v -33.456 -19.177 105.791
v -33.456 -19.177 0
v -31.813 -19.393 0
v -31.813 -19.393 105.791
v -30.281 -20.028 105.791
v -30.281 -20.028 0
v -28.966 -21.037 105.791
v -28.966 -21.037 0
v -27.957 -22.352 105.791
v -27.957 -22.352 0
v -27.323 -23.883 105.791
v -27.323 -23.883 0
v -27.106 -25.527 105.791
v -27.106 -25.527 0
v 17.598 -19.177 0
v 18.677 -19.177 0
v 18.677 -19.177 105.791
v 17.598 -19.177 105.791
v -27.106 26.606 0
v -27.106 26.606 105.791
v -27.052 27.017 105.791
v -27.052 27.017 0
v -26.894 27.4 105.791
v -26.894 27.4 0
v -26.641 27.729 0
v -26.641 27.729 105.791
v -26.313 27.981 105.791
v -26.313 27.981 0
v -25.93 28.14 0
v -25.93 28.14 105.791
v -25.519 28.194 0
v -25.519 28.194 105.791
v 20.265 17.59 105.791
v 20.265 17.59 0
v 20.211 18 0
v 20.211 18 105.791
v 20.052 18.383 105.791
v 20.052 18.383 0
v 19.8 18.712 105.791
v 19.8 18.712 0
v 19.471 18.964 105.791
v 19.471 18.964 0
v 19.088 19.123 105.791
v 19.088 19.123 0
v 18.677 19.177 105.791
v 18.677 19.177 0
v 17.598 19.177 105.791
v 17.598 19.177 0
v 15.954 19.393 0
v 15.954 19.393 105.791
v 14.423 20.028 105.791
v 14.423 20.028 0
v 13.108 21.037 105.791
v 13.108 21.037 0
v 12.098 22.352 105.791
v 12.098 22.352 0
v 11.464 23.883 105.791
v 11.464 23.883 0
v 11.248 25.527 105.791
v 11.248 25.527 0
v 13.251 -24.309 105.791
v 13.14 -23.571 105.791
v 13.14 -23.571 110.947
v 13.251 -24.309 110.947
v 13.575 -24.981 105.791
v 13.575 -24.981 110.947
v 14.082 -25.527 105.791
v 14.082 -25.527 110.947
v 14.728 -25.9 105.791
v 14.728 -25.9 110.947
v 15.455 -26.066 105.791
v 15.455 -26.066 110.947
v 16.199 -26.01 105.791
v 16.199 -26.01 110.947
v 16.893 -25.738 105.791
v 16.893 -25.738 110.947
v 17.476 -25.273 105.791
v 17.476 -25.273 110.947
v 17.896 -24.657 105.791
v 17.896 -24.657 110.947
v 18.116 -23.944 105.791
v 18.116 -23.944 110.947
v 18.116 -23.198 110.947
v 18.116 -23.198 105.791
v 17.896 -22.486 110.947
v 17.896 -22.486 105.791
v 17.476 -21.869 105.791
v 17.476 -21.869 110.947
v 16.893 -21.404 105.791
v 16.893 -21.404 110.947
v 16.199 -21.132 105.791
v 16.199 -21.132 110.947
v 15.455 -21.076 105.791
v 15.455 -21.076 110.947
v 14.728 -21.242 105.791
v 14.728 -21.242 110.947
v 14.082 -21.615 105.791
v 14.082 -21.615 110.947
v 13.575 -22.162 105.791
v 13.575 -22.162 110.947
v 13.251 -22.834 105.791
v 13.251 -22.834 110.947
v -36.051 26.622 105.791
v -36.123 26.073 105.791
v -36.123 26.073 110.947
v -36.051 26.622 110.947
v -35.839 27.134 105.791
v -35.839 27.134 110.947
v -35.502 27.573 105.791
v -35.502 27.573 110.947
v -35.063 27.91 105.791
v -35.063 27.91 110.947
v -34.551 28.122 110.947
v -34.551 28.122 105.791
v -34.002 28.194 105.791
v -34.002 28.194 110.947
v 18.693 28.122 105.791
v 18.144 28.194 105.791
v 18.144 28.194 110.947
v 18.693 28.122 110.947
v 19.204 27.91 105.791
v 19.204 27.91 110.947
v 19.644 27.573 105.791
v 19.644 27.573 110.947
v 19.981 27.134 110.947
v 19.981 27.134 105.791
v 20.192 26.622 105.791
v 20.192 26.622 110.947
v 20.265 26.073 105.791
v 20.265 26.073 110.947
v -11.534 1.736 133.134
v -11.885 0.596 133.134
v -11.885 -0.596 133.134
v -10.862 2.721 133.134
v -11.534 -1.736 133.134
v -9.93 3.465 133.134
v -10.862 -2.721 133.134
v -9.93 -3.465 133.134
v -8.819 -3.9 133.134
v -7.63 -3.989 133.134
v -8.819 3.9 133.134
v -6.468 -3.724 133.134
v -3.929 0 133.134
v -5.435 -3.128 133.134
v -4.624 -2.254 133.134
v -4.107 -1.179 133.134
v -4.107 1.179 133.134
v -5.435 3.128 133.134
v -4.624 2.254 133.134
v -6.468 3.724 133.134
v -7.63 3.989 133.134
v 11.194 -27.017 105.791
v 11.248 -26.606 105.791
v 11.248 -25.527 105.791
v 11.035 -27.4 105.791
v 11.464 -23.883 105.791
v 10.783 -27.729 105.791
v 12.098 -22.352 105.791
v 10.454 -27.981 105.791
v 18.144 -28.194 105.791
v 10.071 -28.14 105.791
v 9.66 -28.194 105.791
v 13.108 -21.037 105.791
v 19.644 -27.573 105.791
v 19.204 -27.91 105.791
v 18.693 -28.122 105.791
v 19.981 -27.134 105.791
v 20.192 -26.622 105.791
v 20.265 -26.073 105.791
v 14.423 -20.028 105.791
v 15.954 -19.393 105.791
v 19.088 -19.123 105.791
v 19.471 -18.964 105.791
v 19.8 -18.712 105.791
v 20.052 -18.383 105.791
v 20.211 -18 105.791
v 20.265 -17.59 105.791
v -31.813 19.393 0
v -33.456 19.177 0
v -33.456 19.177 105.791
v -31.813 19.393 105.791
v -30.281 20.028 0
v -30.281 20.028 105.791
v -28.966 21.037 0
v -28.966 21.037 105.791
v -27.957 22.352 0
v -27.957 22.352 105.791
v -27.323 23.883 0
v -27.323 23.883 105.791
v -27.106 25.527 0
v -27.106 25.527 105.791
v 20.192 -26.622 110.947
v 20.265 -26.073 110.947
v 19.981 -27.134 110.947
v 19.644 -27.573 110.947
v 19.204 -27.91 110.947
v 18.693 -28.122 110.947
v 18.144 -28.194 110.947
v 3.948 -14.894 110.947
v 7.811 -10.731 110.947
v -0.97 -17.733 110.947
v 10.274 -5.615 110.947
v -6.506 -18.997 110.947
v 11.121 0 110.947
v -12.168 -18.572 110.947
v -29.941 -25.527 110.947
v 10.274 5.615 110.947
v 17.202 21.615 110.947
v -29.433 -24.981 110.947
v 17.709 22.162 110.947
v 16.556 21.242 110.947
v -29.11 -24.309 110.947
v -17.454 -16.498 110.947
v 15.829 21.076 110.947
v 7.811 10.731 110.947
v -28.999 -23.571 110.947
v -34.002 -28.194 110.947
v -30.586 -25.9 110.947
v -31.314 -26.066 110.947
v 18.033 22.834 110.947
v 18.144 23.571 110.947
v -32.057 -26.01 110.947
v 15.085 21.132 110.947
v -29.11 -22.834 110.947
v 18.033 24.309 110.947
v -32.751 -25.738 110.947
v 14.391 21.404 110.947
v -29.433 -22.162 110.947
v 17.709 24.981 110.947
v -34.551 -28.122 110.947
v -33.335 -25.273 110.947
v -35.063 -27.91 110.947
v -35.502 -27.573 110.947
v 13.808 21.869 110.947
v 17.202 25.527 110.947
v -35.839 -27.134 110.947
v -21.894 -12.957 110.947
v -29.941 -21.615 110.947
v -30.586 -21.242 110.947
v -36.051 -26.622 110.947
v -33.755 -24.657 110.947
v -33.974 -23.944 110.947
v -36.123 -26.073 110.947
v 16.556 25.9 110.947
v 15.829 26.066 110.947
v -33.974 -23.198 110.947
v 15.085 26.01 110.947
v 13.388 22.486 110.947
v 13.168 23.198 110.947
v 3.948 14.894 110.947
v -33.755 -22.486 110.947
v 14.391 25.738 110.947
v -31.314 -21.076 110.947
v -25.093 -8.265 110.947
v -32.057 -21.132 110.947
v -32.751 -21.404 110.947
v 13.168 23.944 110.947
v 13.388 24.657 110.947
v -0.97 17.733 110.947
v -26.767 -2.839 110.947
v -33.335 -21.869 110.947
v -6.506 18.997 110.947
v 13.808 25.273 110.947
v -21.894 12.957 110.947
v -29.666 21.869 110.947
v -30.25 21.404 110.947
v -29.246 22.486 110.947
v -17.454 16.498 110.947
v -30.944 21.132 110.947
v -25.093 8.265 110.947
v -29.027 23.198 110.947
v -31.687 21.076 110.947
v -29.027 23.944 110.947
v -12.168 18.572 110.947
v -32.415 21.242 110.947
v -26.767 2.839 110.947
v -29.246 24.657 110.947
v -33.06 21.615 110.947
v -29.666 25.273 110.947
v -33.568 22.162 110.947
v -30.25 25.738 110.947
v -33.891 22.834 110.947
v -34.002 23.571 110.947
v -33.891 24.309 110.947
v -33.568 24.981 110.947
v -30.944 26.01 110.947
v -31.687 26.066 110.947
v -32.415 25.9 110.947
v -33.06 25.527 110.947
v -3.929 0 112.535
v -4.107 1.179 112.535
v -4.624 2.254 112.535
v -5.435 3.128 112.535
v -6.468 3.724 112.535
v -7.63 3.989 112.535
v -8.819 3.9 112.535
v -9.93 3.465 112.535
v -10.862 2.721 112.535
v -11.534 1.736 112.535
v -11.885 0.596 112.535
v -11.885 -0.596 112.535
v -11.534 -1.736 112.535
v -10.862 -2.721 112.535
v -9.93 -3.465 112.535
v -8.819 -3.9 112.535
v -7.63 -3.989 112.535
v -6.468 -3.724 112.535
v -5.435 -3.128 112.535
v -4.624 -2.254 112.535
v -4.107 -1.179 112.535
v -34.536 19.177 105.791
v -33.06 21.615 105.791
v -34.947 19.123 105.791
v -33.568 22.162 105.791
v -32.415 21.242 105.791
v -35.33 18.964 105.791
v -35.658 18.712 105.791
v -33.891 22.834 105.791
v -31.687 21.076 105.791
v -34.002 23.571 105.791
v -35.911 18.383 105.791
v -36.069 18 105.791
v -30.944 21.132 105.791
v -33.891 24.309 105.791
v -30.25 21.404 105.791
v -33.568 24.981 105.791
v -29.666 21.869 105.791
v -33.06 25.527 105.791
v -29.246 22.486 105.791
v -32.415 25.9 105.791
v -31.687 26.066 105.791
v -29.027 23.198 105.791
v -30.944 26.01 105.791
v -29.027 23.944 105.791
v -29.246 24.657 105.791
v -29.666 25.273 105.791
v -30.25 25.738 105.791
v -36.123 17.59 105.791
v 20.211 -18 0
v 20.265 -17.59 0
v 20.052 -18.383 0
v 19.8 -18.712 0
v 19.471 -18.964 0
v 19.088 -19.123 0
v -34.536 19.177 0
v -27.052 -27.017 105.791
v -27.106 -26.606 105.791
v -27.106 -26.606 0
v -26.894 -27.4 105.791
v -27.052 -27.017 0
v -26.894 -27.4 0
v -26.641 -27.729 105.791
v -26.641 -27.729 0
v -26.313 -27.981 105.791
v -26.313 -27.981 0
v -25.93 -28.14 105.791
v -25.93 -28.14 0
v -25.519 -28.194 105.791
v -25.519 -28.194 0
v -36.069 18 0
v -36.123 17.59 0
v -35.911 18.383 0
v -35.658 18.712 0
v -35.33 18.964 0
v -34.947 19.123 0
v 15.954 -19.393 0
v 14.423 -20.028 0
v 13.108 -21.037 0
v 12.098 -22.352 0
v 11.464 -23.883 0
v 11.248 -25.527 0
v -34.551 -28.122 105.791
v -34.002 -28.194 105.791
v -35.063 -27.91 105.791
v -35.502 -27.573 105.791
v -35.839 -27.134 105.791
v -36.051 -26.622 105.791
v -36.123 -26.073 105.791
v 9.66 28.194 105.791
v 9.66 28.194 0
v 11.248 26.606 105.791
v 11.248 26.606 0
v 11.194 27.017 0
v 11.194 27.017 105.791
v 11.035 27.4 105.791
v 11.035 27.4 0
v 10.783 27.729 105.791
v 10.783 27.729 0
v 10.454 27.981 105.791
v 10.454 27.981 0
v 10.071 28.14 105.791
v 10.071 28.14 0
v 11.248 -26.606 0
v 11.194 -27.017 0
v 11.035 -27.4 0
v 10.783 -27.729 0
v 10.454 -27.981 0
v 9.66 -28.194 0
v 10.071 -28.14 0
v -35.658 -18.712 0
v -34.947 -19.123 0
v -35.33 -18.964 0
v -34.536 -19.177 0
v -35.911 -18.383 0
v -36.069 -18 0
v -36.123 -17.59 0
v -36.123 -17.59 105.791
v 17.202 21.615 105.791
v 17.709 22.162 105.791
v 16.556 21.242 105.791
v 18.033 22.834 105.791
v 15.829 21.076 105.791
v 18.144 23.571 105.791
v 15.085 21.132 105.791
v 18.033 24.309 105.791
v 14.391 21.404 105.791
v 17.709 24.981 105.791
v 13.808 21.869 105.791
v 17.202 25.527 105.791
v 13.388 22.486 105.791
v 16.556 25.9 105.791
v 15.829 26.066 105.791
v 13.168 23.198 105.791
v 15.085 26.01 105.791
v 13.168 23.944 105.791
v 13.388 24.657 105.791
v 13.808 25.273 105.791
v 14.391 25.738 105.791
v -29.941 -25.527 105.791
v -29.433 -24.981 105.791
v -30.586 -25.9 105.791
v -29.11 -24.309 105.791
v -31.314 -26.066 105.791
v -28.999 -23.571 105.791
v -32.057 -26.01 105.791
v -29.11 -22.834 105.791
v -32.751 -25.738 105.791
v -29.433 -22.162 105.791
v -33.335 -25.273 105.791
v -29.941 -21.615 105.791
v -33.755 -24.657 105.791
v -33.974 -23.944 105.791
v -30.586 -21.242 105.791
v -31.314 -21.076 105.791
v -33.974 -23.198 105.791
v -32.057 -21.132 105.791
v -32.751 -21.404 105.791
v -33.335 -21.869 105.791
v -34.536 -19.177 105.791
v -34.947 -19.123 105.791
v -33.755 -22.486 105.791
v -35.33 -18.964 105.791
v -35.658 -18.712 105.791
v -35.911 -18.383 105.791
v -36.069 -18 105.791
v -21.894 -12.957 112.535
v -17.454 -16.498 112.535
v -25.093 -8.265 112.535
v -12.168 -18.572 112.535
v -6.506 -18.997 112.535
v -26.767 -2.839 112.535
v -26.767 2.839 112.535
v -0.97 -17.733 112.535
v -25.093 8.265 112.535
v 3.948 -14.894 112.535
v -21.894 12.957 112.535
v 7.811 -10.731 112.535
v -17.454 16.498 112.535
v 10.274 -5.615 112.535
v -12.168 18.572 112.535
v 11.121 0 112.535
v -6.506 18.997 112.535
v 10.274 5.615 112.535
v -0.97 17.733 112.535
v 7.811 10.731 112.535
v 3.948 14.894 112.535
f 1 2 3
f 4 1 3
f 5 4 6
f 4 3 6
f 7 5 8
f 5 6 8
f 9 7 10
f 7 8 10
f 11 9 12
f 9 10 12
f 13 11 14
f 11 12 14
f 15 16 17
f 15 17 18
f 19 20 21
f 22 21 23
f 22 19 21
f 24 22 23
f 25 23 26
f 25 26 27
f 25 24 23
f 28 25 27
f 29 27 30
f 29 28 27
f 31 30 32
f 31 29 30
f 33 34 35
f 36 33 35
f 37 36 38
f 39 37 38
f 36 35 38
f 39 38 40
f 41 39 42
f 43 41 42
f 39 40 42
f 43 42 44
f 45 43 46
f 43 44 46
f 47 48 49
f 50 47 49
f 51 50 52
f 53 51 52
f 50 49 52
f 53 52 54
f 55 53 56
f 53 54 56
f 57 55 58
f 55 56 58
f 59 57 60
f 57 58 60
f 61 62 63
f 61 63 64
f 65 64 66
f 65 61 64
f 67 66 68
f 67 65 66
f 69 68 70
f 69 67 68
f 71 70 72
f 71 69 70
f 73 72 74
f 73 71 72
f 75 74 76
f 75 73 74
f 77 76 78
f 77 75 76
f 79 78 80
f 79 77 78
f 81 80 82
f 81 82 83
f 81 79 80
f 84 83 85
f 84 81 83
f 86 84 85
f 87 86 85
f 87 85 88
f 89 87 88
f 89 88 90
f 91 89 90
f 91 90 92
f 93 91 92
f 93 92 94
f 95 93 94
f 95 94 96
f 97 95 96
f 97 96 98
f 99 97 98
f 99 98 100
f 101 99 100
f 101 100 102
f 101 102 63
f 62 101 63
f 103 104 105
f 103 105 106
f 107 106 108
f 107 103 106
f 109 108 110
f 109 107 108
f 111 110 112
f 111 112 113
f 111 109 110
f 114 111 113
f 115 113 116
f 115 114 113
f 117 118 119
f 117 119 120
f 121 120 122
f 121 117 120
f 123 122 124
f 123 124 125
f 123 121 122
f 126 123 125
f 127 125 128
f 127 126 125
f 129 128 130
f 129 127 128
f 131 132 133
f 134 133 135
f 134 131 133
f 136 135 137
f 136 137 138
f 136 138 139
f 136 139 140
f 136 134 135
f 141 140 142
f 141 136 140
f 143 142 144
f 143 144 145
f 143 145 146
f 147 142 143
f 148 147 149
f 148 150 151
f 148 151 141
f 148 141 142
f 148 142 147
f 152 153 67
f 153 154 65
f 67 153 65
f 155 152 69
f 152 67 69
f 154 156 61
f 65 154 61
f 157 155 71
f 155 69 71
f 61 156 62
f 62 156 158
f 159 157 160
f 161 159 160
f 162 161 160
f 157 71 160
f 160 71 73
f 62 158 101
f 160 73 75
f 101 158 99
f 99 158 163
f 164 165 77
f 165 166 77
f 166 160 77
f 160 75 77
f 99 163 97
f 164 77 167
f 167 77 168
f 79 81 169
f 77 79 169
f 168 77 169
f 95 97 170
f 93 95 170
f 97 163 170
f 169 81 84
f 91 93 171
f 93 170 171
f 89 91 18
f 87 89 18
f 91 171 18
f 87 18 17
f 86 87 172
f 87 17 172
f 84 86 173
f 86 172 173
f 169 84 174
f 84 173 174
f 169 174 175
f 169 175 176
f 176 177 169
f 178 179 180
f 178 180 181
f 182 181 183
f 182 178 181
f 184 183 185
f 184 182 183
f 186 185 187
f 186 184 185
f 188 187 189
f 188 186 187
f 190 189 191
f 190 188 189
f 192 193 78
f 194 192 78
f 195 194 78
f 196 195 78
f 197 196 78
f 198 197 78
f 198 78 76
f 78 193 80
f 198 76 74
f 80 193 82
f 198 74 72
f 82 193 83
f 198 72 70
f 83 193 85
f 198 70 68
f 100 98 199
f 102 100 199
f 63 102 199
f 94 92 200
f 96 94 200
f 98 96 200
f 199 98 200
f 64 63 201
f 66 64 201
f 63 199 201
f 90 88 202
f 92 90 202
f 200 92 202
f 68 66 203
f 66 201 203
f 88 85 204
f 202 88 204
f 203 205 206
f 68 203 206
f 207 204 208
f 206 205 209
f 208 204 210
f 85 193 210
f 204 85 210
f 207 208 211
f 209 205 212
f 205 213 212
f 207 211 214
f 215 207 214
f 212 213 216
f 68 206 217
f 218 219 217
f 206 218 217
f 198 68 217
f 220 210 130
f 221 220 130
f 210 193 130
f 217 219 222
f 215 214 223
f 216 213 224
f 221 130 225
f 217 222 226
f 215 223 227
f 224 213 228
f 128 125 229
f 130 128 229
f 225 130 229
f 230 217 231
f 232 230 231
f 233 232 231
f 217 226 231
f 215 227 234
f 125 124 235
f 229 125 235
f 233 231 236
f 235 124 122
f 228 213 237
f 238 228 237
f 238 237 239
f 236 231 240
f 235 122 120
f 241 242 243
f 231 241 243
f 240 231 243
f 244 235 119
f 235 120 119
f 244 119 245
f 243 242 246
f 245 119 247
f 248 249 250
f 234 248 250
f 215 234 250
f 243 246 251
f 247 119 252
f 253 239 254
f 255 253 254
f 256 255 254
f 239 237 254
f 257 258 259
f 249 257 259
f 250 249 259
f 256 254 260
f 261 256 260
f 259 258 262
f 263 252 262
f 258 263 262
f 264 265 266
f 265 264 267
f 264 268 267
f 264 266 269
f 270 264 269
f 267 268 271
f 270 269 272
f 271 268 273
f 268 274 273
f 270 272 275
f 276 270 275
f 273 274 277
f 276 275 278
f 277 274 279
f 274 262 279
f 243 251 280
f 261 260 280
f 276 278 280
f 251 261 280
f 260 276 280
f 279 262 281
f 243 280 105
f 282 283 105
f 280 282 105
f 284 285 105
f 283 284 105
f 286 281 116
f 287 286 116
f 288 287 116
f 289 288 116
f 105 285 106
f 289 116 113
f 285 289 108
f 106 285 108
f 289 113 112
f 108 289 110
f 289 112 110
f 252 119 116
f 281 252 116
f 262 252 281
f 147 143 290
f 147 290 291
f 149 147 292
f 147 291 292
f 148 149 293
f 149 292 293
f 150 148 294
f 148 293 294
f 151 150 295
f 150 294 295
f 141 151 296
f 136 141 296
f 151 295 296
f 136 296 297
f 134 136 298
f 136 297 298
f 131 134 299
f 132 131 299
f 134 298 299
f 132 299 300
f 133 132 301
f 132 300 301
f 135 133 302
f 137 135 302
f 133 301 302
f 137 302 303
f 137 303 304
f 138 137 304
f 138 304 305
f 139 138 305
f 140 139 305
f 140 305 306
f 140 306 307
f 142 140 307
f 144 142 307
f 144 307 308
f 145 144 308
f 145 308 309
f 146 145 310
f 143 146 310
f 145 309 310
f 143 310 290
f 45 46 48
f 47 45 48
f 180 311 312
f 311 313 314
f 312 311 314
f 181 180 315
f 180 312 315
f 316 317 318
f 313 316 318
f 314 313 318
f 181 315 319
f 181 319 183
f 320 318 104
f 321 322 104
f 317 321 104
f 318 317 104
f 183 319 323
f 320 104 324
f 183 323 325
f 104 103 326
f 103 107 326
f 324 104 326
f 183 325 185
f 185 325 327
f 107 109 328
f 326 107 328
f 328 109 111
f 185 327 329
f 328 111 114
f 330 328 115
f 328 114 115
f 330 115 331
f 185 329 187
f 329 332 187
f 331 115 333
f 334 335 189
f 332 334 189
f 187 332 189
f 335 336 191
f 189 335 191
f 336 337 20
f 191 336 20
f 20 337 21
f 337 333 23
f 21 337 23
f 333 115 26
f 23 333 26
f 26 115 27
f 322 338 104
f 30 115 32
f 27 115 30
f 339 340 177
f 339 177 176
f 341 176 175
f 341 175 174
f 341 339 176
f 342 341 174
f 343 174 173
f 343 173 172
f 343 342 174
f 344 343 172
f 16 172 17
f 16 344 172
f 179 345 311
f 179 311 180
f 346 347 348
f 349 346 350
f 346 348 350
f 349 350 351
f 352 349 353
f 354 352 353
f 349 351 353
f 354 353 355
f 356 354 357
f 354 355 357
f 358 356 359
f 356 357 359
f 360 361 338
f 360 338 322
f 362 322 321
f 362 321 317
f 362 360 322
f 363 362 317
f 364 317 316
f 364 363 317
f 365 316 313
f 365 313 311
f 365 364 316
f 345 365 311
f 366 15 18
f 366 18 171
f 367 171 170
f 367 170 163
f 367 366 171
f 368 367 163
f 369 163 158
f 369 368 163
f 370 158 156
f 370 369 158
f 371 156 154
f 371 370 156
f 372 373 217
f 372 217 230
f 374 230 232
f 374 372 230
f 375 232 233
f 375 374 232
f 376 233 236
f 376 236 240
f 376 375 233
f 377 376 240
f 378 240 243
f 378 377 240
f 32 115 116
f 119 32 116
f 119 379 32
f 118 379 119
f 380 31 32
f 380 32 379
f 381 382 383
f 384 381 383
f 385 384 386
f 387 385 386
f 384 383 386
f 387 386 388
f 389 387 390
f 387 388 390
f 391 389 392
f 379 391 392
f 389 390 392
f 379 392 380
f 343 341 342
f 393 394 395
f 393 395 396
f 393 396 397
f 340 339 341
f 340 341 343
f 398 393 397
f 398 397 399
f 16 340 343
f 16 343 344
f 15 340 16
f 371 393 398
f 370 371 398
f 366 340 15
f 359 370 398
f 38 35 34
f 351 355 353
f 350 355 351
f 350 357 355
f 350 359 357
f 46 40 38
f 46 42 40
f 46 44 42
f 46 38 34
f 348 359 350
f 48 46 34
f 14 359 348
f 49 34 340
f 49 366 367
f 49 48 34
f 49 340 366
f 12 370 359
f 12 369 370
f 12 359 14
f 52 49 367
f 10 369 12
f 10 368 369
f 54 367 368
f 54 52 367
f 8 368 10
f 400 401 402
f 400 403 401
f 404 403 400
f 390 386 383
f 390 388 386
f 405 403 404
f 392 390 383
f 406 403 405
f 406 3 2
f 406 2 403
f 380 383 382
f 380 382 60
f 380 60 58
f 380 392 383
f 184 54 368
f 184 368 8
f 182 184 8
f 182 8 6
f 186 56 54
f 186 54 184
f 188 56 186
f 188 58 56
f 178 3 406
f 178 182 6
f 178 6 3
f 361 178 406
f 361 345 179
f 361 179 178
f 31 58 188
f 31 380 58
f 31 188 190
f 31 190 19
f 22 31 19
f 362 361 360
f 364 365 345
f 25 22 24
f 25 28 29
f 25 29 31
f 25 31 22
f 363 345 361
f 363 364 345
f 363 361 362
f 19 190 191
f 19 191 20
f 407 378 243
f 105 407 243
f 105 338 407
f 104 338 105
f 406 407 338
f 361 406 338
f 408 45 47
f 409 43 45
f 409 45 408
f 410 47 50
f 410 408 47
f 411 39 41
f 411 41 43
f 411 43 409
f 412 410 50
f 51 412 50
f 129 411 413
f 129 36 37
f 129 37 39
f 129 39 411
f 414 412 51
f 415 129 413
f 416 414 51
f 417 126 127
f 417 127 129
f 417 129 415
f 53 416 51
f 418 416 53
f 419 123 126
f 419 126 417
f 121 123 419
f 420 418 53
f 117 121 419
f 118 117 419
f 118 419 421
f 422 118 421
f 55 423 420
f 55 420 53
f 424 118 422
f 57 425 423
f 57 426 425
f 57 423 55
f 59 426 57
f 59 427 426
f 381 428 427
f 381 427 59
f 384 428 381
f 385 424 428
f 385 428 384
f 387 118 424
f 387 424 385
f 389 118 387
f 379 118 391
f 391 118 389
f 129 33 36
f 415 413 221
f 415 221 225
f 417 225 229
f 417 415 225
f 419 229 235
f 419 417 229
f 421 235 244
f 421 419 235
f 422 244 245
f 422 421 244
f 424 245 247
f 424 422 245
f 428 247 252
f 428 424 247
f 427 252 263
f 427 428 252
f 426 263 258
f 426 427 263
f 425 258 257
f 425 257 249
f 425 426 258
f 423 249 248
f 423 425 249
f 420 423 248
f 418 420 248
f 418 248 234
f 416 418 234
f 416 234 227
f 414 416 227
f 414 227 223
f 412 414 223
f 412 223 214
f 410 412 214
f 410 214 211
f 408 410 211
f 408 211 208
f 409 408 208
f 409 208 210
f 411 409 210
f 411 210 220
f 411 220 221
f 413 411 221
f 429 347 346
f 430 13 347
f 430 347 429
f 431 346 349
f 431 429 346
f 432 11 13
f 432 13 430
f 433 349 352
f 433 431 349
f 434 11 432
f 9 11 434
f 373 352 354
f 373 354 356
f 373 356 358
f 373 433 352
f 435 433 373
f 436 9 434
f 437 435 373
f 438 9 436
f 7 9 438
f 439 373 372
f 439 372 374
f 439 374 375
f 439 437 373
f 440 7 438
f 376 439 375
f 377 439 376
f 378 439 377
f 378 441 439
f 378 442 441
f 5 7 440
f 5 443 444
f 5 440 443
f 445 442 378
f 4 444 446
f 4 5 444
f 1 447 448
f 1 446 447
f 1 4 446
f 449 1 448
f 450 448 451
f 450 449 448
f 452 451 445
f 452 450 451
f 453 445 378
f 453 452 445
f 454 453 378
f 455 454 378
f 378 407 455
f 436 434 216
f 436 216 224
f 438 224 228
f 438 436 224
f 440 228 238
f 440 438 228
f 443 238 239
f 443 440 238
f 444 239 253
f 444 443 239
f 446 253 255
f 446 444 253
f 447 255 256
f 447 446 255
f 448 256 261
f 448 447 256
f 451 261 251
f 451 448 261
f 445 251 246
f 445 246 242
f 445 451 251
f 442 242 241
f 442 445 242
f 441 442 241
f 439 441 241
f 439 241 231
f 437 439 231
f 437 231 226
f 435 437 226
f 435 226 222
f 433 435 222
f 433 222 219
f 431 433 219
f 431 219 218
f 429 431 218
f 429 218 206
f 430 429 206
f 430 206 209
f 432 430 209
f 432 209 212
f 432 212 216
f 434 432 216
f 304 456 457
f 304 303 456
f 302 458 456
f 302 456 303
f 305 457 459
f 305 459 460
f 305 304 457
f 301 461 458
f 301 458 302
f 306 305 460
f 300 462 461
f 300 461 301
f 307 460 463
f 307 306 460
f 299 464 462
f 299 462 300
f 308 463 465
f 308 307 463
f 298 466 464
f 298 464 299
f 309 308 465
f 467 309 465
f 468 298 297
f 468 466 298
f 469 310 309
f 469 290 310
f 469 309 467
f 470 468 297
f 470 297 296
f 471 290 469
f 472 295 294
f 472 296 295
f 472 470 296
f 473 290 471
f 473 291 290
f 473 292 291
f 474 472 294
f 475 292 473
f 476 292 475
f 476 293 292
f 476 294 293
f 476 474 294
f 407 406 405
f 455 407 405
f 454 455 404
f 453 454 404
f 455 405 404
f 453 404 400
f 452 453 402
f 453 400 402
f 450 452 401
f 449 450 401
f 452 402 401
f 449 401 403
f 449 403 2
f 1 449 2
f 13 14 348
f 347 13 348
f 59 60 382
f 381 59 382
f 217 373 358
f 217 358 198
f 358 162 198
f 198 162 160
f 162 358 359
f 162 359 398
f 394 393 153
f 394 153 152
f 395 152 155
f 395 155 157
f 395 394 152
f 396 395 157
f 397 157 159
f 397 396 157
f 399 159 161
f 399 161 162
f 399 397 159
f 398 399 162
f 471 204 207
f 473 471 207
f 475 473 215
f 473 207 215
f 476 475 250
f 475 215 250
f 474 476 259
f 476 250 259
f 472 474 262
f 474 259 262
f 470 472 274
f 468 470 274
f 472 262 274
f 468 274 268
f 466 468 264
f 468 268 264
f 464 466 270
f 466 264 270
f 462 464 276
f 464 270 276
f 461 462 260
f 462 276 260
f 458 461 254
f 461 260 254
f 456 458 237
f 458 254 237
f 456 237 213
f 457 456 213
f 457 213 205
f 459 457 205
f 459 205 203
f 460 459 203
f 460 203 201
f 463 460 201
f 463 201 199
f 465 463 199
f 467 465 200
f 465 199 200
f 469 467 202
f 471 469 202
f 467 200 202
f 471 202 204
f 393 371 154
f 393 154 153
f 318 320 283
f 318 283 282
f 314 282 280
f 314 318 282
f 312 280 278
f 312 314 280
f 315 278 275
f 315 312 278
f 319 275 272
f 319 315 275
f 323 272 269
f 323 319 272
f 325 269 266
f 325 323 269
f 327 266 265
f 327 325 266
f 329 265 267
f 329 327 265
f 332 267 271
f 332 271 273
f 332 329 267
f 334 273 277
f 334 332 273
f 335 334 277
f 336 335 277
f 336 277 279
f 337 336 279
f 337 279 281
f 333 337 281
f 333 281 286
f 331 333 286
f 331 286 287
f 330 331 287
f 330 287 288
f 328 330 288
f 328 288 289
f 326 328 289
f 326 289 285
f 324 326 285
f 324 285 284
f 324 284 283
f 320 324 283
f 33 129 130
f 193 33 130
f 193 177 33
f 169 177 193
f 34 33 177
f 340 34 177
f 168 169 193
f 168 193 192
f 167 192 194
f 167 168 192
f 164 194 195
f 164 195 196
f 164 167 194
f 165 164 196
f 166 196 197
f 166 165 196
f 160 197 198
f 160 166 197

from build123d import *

# Parameters (mm, degrees)
SKETCH1_R           = 2.5019
BOSS_EXTRUDE1_DEPTH = 110.9472
SKETCH2_R           = 19.05
BOSS_EXTRUDE2_DEPTH = 1.5875
SKETCH3_R           = 4.0005
BOSS_EXTRUDE3_DEPTH = 20.5994
CUT_EXTRUDE1_DEPTH  = 105.791


with BuildPart() as part:
    # Sketch1 → Boss-Extrude1 (new body)
    with BuildSketch(Plane.XY):
        with BuildLine():
            Line((-34.002396427, 28.194), (18.143803573, 28.194))
            ThreePointArc((18.143803573, 28.194), (19.643506345, 27.572802772), (20.264703573, 26.0731))
            Line((20.264703573, 26.0731), (20.264703573, -26.0731))
            ThreePointArc((20.264703573, -26.0731), (19.643506345, -27.572802772), (18.143803573, -28.194))
            Line((18.143803573, -28.194), (-34.002396427, -28.194))
            ThreePointArc((-34.002396427, -28.194), (-35.502099199, -27.572802772), (-36.123296427, -26.0731))
            Line((-36.123296427, -26.0731), (-36.123296427, 26.0731))
            ThreePointArc((-36.123296427, 26.0731), (-35.502099199, 27.572802772), (-34.002396427, 28.194))
        make_face()
        with Locations((15.641903573, 23.5712)):
            Circle(SKETCH1_R, mode=Mode.SUBTRACT)
        with Locations(Location((-31.500496427, 23.5712, 0), (0, 0, 180))):
            Circle(SKETCH1_R, mode=Mode.SUBTRACT)
        with Locations((-31.500496427, -23.5712)):
            Circle(SKETCH1_R, mode=Mode.SUBTRACT)
        with Locations(Location((15.641903573, -23.5712, 0), (0, 0, 180))):
            Circle(SKETCH1_R, mode=Mode.SUBTRACT)
    extrude(amount=BOSS_EXTRUDE1_DEPTH)

    # Sketch2 → Boss-Extrude2 (add)
    with BuildSketch(Plane.XY.offset(110.9472)):
        with Locations((-7.929296427, 0)):
            Circle(SKETCH2_R)
    extrude(amount=BOSS_EXTRUDE2_DEPTH)

    # Sketch3 → Boss-Extrude3 (add)
    with BuildSketch(Plane.XY.offset(112.5347)):
        with Locations((-7.929296427, 0)):
            Circle(SKETCH3_R)
    extrude(amount=BOSS_EXTRUDE3_DEPTH)

    # Sketch4 → Cut-Extrude1 (cut)
    with BuildSketch(Plane(origin=(0, 0, 0), x_dir=(-1, 0, 0), z_dir=(0, 0, -1))):
        with BuildLine():
            Line((34.535796427, -19.177), (33.456296427, -19.177))
            ThreePointArc((33.456296427, -19.177), (28.966168367, -21.036871939), (27.106296427, -25.527))
            Line((27.106296427, -25.527), (27.106296427, -26.6065))
            ThreePointArc((27.106296427, -26.6065), (26.641328442, -27.729032015), (25.518796427, -28.194))
            Line((25.518796427, -28.194), (18.677208221, -28.194))
            Line((18.677208221, -28.194), (18.677208221, -39.079996732))
            Line((18.677208221, -39.079996732), (53.323924266, -39.079996732))
            Line((53.323924266, -39.079996732), (53.323924266, -7.667262783))
            Line((53.323924266, -7.667262783), (36.123296427, -7.667262783))
            Line((36.123296427, -7.667262783), (36.123296427, -17.5895))
            ThreePointArc((36.123296427, -17.5895), (35.658328442, -18.712032015), (34.535796427, -19.177))
        make_face()
        with BuildLine():
            Line((36.123296427, 7.667262783), (36.123296427, 17.5895))
            ThreePointArc((36.123296427, 17.5895), (35.658328442, 18.712032015), (34.535796427, 19.177))
            Line((34.535796427, 19.177), (33.456296427, 19.177))
            ThreePointArc((33.456296427, 19.177), (28.966168367, 21.036871939), (27.106296427, 25.527))
            Line((27.106296427, 25.527), (27.106296427, 26.6065))
            ThreePointArc((27.106296427, 26.6065), (26.641328442, 27.729032015), (25.518796427, 28.194))
            Line((25.518796427, 28.194), (18.677208221, 28.194))
            Line((18.677208221, 28.194), (18.677208221, 39.079996732))
            Line((18.677208221, 39.079996732), (53.323924266, 39.079996732))
            Line((53.323924266, 39.079996732), (53.323924266, 7.667262783))
            Line((53.323924266, 7.667262783), (36.123296427, 7.667262783))
        make_face()
        with BuildLine():
            Line((-18.677203573, 19.177), (-17.597703573, 19.177))
            ThreePointArc((-17.597703573, 19.177), (-13.107575512, 21.036871939), (-11.247703573, 25.527))
            Line((-11.247703573, 25.527), (-11.247703573, 26.6065))
            ThreePointArc((-11.247703573, 26.6065), (-10.782735588, 27.729032015), (-9.660203573, 28.194))
            Line((-9.660203573, 28.194), (-2.818615366, 28.194))
            Line((-2.818615366, 28.194), (-2.818615366, 39.079996732))
            Line((-2.818615366, 39.079996732), (-37.465331412, 39.079996732))
            Line((-37.465331412, 39.079996732), (-37.465331412, 7.667262783))
            Line((-37.465331412, 7.667262783), (-20.264703573, 7.667262783))
            Line((-20.264703573, 7.667262783), (-20.264703573, 17.5895))
            ThreePointArc((-20.264703573, 17.5895), (-19.799735588, 18.712032015), (-18.677203573, 19.177))
        make_face()
        with BuildLine():
            Line((-20.264703573, -7.667262783), (-20.264703573, -17.5895))
            ThreePointArc((-20.264703573, -17.5895), (-19.799735588, -18.712032015), (-18.677203573, -19.177))
            Line((-18.677203573, -19.177), (-17.597703573, -19.177))
            ThreePointArc((-17.597703573, -19.177), (-13.107575512, -21.036871939), (-11.247703573, -25.527))
            Line((-11.247703573, -25.527), (-11.247703573, -26.6065))
            ThreePointArc((-11.247703573, -26.6065), (-10.782735588, -27.729032015), (-9.660203573, -28.194))
            Line((-9.660203573, -28.194), (-2.818615366, -28.194))
            Line((-2.818615366, -28.194), (-2.818615366, -39.079996732))
            Line((-2.818615366, -39.079996732), (-37.465331412, -39.079996732))
            Line((-37.465331412, -39.079996732), (-37.465331412, -7.667262783))
            Line((-37.465331412, -7.667262783), (-20.264703573, -7.667262783))
        make_face()
    extrude(amount=-CUT_EXTRUDE1_DEPTH, mode=Mode.SUBTRACT)


solid = part.part
